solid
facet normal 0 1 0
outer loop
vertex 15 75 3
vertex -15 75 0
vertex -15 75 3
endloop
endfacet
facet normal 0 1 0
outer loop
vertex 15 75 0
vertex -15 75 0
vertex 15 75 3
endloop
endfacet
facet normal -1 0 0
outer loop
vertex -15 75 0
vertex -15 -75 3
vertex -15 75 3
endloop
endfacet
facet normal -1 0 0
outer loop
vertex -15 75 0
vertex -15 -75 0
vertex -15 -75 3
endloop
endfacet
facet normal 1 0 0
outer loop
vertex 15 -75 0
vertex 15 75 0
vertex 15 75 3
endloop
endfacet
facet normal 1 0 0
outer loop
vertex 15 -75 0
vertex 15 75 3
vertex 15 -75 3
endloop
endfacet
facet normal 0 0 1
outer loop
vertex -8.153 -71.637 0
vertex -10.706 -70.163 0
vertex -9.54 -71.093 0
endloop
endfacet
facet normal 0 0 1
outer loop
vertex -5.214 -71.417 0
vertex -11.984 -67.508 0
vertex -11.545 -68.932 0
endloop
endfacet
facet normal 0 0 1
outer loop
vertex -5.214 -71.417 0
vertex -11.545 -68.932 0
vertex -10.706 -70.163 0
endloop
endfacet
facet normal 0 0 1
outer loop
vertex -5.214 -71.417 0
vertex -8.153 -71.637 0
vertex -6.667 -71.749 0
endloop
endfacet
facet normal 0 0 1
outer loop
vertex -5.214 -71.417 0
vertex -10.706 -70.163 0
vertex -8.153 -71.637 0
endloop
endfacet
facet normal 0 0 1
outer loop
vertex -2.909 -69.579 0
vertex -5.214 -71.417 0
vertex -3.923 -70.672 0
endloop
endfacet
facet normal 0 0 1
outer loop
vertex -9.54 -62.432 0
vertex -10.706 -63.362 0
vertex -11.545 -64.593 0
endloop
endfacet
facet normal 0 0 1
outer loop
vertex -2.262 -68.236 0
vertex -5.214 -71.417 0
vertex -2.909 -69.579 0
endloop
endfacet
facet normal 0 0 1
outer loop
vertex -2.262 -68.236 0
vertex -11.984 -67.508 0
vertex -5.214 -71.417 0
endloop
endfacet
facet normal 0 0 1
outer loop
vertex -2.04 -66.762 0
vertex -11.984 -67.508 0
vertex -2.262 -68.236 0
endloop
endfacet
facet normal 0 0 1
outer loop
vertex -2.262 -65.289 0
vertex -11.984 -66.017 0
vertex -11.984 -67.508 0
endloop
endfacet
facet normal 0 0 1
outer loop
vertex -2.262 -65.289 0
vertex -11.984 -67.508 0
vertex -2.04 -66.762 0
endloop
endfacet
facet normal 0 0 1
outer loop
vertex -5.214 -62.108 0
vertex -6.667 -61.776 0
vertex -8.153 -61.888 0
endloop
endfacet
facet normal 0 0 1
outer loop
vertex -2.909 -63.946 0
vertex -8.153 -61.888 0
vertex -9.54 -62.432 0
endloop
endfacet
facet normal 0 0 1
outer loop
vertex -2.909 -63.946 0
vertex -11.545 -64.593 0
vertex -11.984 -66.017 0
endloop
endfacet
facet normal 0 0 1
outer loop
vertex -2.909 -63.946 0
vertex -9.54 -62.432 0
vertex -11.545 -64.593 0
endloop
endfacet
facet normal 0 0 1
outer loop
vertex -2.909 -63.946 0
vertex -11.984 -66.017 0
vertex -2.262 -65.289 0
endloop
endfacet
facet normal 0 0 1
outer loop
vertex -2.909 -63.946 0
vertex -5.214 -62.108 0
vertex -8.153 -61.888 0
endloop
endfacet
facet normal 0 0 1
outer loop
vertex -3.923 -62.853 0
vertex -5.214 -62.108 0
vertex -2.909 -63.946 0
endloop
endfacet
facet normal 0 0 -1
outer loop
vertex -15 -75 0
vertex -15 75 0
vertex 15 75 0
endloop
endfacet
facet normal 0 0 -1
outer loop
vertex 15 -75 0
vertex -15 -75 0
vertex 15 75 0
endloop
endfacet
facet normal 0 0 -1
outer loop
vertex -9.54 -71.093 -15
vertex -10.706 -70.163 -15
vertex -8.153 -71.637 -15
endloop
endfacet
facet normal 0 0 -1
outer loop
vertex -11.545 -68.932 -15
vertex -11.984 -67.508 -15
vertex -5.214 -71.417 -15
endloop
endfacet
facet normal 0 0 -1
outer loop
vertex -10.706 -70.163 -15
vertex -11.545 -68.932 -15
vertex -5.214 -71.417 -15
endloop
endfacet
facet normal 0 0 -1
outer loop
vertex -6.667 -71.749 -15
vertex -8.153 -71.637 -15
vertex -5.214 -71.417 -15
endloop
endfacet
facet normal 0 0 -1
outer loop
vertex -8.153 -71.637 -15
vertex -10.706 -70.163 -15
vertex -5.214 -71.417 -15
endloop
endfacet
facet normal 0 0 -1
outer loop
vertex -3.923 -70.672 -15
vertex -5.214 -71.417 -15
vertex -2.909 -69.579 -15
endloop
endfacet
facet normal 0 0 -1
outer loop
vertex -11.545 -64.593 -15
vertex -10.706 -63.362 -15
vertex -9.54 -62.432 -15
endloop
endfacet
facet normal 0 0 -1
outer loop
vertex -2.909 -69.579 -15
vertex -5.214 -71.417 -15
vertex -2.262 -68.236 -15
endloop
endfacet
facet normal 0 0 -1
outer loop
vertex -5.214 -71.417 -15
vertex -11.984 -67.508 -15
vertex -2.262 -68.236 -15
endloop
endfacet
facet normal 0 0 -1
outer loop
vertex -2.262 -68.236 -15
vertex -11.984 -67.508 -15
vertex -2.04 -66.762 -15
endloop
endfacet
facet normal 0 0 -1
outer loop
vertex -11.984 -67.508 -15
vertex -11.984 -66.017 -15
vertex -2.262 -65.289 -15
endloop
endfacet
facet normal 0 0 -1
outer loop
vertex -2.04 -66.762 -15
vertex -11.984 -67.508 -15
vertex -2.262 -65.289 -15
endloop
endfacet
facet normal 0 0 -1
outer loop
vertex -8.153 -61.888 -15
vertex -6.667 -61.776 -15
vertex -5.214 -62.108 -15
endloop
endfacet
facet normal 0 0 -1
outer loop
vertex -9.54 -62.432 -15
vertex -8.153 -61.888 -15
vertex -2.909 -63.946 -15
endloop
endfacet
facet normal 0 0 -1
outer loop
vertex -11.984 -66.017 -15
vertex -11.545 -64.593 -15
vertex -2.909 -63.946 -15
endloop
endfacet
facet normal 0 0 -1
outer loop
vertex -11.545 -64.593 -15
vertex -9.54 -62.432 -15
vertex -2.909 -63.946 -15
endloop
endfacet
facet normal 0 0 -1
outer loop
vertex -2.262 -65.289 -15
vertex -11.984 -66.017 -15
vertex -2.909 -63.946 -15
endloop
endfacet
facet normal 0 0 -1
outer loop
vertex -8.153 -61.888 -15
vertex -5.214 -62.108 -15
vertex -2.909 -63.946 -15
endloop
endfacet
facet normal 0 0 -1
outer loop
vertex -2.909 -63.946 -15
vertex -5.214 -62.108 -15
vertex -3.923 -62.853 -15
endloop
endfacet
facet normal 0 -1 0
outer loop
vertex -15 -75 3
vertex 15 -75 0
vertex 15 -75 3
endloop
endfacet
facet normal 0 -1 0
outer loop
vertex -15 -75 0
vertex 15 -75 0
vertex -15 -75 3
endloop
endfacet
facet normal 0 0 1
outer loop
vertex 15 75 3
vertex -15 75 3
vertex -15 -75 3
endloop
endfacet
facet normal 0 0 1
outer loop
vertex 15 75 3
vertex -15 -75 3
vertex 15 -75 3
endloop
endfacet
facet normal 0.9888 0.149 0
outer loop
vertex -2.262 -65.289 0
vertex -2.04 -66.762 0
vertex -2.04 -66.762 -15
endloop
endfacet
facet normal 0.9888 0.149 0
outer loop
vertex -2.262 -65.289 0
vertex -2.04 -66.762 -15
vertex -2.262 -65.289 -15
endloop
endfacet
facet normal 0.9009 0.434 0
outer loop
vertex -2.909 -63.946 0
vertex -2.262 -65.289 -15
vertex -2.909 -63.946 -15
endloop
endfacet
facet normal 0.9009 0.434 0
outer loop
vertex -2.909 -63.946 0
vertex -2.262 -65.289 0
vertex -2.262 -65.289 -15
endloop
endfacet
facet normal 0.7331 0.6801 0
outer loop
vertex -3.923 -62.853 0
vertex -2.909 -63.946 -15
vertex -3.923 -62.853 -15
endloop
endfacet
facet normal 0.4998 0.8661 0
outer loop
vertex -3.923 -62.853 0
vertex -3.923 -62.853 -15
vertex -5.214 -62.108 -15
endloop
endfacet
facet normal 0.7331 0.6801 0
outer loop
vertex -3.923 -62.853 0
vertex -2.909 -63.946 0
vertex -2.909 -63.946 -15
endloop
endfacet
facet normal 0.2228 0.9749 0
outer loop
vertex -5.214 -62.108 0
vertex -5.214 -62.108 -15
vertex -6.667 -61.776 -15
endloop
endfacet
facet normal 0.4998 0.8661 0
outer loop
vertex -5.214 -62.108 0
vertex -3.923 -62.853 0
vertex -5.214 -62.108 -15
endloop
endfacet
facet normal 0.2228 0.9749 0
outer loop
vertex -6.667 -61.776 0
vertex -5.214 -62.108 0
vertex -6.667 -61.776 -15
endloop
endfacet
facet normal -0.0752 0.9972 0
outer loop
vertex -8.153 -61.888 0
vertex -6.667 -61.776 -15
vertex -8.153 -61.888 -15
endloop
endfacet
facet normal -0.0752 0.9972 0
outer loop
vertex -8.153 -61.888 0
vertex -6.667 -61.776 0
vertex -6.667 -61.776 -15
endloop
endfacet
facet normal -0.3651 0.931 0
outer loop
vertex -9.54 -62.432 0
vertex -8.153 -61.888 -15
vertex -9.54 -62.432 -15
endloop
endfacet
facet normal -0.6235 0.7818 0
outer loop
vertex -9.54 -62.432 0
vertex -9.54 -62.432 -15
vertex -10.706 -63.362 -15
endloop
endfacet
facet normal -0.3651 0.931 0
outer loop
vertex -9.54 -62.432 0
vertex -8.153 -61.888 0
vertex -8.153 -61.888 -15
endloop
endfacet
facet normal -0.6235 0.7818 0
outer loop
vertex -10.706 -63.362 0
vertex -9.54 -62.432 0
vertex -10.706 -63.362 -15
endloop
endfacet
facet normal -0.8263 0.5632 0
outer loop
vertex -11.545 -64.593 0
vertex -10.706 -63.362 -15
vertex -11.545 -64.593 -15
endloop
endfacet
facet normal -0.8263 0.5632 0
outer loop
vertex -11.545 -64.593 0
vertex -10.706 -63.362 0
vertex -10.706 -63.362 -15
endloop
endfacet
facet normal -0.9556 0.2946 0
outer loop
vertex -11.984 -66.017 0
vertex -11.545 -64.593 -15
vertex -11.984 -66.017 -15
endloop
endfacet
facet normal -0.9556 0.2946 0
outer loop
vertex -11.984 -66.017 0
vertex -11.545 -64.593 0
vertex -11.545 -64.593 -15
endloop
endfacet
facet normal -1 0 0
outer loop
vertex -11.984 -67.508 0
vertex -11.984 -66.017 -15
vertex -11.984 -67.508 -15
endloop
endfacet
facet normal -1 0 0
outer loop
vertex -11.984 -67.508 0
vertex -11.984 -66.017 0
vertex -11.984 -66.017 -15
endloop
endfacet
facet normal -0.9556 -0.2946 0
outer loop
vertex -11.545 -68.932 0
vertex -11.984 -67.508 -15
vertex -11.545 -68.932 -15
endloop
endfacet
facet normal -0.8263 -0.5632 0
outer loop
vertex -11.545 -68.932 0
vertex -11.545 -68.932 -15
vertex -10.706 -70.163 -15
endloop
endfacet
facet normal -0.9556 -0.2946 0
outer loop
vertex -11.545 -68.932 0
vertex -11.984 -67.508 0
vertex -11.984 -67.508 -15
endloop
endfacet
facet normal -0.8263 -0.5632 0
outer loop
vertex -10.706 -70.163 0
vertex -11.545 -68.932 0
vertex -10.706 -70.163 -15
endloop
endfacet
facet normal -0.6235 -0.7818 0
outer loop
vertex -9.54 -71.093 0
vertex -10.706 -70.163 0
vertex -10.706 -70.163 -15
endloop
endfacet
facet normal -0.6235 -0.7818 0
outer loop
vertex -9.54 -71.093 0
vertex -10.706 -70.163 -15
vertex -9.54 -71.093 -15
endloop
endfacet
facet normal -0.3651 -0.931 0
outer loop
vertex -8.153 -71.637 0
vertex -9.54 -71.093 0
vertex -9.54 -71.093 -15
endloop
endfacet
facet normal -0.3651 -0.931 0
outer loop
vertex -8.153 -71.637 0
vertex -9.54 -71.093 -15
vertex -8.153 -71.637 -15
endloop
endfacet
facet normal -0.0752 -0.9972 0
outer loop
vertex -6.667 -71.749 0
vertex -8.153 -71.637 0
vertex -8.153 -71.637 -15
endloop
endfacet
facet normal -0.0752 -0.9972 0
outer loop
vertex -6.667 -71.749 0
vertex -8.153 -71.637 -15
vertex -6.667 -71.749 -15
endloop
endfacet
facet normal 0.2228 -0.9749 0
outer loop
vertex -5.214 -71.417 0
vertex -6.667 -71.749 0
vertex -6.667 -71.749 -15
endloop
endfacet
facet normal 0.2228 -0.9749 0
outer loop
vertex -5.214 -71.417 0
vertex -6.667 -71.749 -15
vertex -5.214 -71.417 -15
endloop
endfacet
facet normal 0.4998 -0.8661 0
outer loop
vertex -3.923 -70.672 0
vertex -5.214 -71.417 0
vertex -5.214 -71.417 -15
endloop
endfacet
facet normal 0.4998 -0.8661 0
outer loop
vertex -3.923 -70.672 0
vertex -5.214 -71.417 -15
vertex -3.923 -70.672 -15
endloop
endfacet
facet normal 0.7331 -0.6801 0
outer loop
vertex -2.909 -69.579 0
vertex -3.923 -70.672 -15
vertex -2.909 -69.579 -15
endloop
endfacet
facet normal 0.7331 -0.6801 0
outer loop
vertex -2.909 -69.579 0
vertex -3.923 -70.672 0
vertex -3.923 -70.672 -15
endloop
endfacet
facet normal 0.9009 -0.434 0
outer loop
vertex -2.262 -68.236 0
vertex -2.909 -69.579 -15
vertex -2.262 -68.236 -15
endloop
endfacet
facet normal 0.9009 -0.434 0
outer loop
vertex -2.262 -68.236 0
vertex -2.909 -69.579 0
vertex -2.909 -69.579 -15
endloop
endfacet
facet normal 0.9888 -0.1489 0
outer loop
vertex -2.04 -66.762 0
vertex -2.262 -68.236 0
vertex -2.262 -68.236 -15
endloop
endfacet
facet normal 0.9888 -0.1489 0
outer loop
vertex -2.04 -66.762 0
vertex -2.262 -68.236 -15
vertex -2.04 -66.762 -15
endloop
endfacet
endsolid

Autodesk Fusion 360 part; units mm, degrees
sketch "スケッチ1" plane through (0, 0, 0) normal (0, 0, 1) x (1, 0, 0)
  line L0 (15, -75) -> (-15, 75) construction
  line L1 (-15, -75) -> (-15, 75)
  line L2 (-15, -75) -> (15, 75) construction
  line L3 (15, 75) -> (15, -75)
  line L4 (-15, 75) -> (15, 75)
  line L5 (15, -75) -> (-15, -75)
  dimension "d1" = 150
  dimension "d2" = 30
extrude "押し出し1" add sketch "スケッチ1" along normal blind 3 makes body 1
sketch "スケッチ2" plane through (0, 0, 0) normal (0, 0, 1) x (1, 0, 0)
  circle A0 centre (-7.0403, -66.7625) radius 5
  dimension "d5" = 10
extrude "押し出し2" add sketch "スケッチ2" against normal blind 15 separate body makes body 2
